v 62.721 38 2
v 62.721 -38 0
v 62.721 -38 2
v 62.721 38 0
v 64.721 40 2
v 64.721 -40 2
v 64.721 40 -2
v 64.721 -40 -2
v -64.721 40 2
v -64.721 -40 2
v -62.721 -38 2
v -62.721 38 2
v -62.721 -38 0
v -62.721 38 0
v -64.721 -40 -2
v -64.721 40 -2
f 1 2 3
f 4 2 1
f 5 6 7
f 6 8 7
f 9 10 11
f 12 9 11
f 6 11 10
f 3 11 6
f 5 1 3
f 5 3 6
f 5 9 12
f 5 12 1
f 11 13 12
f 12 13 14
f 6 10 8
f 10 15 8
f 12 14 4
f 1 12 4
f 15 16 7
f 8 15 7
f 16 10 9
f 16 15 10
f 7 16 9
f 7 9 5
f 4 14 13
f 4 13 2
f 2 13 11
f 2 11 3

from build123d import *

# Parameters (mm, degrees)
F0_W     = 129.44272
F0_H     = 80
F1_DEPTH = 2
F2_W     = 129.44272
F2_H     = 80
F2_W_2   = 125.44272
F2_H_2   = 76
F3_DEPTH = 2


with BuildPart() as f1:
    # F0 (on Top) → F1 (new body)
    with BuildSketch(Plane.XY):
        Rectangle(F0_W, F0_H)
    extrude(amount=-F1_DEPTH)

    # F2 (on Top) → F3 (join)
    with BuildSketch(Plane.XY):
        Rectangle(F2_W, F2_H)
        Rectangle(F2_W_2, F2_H_2, mode=Mode.SUBTRACT)
    extrude(amount=F3_DEPTH)


solid = f1.part
